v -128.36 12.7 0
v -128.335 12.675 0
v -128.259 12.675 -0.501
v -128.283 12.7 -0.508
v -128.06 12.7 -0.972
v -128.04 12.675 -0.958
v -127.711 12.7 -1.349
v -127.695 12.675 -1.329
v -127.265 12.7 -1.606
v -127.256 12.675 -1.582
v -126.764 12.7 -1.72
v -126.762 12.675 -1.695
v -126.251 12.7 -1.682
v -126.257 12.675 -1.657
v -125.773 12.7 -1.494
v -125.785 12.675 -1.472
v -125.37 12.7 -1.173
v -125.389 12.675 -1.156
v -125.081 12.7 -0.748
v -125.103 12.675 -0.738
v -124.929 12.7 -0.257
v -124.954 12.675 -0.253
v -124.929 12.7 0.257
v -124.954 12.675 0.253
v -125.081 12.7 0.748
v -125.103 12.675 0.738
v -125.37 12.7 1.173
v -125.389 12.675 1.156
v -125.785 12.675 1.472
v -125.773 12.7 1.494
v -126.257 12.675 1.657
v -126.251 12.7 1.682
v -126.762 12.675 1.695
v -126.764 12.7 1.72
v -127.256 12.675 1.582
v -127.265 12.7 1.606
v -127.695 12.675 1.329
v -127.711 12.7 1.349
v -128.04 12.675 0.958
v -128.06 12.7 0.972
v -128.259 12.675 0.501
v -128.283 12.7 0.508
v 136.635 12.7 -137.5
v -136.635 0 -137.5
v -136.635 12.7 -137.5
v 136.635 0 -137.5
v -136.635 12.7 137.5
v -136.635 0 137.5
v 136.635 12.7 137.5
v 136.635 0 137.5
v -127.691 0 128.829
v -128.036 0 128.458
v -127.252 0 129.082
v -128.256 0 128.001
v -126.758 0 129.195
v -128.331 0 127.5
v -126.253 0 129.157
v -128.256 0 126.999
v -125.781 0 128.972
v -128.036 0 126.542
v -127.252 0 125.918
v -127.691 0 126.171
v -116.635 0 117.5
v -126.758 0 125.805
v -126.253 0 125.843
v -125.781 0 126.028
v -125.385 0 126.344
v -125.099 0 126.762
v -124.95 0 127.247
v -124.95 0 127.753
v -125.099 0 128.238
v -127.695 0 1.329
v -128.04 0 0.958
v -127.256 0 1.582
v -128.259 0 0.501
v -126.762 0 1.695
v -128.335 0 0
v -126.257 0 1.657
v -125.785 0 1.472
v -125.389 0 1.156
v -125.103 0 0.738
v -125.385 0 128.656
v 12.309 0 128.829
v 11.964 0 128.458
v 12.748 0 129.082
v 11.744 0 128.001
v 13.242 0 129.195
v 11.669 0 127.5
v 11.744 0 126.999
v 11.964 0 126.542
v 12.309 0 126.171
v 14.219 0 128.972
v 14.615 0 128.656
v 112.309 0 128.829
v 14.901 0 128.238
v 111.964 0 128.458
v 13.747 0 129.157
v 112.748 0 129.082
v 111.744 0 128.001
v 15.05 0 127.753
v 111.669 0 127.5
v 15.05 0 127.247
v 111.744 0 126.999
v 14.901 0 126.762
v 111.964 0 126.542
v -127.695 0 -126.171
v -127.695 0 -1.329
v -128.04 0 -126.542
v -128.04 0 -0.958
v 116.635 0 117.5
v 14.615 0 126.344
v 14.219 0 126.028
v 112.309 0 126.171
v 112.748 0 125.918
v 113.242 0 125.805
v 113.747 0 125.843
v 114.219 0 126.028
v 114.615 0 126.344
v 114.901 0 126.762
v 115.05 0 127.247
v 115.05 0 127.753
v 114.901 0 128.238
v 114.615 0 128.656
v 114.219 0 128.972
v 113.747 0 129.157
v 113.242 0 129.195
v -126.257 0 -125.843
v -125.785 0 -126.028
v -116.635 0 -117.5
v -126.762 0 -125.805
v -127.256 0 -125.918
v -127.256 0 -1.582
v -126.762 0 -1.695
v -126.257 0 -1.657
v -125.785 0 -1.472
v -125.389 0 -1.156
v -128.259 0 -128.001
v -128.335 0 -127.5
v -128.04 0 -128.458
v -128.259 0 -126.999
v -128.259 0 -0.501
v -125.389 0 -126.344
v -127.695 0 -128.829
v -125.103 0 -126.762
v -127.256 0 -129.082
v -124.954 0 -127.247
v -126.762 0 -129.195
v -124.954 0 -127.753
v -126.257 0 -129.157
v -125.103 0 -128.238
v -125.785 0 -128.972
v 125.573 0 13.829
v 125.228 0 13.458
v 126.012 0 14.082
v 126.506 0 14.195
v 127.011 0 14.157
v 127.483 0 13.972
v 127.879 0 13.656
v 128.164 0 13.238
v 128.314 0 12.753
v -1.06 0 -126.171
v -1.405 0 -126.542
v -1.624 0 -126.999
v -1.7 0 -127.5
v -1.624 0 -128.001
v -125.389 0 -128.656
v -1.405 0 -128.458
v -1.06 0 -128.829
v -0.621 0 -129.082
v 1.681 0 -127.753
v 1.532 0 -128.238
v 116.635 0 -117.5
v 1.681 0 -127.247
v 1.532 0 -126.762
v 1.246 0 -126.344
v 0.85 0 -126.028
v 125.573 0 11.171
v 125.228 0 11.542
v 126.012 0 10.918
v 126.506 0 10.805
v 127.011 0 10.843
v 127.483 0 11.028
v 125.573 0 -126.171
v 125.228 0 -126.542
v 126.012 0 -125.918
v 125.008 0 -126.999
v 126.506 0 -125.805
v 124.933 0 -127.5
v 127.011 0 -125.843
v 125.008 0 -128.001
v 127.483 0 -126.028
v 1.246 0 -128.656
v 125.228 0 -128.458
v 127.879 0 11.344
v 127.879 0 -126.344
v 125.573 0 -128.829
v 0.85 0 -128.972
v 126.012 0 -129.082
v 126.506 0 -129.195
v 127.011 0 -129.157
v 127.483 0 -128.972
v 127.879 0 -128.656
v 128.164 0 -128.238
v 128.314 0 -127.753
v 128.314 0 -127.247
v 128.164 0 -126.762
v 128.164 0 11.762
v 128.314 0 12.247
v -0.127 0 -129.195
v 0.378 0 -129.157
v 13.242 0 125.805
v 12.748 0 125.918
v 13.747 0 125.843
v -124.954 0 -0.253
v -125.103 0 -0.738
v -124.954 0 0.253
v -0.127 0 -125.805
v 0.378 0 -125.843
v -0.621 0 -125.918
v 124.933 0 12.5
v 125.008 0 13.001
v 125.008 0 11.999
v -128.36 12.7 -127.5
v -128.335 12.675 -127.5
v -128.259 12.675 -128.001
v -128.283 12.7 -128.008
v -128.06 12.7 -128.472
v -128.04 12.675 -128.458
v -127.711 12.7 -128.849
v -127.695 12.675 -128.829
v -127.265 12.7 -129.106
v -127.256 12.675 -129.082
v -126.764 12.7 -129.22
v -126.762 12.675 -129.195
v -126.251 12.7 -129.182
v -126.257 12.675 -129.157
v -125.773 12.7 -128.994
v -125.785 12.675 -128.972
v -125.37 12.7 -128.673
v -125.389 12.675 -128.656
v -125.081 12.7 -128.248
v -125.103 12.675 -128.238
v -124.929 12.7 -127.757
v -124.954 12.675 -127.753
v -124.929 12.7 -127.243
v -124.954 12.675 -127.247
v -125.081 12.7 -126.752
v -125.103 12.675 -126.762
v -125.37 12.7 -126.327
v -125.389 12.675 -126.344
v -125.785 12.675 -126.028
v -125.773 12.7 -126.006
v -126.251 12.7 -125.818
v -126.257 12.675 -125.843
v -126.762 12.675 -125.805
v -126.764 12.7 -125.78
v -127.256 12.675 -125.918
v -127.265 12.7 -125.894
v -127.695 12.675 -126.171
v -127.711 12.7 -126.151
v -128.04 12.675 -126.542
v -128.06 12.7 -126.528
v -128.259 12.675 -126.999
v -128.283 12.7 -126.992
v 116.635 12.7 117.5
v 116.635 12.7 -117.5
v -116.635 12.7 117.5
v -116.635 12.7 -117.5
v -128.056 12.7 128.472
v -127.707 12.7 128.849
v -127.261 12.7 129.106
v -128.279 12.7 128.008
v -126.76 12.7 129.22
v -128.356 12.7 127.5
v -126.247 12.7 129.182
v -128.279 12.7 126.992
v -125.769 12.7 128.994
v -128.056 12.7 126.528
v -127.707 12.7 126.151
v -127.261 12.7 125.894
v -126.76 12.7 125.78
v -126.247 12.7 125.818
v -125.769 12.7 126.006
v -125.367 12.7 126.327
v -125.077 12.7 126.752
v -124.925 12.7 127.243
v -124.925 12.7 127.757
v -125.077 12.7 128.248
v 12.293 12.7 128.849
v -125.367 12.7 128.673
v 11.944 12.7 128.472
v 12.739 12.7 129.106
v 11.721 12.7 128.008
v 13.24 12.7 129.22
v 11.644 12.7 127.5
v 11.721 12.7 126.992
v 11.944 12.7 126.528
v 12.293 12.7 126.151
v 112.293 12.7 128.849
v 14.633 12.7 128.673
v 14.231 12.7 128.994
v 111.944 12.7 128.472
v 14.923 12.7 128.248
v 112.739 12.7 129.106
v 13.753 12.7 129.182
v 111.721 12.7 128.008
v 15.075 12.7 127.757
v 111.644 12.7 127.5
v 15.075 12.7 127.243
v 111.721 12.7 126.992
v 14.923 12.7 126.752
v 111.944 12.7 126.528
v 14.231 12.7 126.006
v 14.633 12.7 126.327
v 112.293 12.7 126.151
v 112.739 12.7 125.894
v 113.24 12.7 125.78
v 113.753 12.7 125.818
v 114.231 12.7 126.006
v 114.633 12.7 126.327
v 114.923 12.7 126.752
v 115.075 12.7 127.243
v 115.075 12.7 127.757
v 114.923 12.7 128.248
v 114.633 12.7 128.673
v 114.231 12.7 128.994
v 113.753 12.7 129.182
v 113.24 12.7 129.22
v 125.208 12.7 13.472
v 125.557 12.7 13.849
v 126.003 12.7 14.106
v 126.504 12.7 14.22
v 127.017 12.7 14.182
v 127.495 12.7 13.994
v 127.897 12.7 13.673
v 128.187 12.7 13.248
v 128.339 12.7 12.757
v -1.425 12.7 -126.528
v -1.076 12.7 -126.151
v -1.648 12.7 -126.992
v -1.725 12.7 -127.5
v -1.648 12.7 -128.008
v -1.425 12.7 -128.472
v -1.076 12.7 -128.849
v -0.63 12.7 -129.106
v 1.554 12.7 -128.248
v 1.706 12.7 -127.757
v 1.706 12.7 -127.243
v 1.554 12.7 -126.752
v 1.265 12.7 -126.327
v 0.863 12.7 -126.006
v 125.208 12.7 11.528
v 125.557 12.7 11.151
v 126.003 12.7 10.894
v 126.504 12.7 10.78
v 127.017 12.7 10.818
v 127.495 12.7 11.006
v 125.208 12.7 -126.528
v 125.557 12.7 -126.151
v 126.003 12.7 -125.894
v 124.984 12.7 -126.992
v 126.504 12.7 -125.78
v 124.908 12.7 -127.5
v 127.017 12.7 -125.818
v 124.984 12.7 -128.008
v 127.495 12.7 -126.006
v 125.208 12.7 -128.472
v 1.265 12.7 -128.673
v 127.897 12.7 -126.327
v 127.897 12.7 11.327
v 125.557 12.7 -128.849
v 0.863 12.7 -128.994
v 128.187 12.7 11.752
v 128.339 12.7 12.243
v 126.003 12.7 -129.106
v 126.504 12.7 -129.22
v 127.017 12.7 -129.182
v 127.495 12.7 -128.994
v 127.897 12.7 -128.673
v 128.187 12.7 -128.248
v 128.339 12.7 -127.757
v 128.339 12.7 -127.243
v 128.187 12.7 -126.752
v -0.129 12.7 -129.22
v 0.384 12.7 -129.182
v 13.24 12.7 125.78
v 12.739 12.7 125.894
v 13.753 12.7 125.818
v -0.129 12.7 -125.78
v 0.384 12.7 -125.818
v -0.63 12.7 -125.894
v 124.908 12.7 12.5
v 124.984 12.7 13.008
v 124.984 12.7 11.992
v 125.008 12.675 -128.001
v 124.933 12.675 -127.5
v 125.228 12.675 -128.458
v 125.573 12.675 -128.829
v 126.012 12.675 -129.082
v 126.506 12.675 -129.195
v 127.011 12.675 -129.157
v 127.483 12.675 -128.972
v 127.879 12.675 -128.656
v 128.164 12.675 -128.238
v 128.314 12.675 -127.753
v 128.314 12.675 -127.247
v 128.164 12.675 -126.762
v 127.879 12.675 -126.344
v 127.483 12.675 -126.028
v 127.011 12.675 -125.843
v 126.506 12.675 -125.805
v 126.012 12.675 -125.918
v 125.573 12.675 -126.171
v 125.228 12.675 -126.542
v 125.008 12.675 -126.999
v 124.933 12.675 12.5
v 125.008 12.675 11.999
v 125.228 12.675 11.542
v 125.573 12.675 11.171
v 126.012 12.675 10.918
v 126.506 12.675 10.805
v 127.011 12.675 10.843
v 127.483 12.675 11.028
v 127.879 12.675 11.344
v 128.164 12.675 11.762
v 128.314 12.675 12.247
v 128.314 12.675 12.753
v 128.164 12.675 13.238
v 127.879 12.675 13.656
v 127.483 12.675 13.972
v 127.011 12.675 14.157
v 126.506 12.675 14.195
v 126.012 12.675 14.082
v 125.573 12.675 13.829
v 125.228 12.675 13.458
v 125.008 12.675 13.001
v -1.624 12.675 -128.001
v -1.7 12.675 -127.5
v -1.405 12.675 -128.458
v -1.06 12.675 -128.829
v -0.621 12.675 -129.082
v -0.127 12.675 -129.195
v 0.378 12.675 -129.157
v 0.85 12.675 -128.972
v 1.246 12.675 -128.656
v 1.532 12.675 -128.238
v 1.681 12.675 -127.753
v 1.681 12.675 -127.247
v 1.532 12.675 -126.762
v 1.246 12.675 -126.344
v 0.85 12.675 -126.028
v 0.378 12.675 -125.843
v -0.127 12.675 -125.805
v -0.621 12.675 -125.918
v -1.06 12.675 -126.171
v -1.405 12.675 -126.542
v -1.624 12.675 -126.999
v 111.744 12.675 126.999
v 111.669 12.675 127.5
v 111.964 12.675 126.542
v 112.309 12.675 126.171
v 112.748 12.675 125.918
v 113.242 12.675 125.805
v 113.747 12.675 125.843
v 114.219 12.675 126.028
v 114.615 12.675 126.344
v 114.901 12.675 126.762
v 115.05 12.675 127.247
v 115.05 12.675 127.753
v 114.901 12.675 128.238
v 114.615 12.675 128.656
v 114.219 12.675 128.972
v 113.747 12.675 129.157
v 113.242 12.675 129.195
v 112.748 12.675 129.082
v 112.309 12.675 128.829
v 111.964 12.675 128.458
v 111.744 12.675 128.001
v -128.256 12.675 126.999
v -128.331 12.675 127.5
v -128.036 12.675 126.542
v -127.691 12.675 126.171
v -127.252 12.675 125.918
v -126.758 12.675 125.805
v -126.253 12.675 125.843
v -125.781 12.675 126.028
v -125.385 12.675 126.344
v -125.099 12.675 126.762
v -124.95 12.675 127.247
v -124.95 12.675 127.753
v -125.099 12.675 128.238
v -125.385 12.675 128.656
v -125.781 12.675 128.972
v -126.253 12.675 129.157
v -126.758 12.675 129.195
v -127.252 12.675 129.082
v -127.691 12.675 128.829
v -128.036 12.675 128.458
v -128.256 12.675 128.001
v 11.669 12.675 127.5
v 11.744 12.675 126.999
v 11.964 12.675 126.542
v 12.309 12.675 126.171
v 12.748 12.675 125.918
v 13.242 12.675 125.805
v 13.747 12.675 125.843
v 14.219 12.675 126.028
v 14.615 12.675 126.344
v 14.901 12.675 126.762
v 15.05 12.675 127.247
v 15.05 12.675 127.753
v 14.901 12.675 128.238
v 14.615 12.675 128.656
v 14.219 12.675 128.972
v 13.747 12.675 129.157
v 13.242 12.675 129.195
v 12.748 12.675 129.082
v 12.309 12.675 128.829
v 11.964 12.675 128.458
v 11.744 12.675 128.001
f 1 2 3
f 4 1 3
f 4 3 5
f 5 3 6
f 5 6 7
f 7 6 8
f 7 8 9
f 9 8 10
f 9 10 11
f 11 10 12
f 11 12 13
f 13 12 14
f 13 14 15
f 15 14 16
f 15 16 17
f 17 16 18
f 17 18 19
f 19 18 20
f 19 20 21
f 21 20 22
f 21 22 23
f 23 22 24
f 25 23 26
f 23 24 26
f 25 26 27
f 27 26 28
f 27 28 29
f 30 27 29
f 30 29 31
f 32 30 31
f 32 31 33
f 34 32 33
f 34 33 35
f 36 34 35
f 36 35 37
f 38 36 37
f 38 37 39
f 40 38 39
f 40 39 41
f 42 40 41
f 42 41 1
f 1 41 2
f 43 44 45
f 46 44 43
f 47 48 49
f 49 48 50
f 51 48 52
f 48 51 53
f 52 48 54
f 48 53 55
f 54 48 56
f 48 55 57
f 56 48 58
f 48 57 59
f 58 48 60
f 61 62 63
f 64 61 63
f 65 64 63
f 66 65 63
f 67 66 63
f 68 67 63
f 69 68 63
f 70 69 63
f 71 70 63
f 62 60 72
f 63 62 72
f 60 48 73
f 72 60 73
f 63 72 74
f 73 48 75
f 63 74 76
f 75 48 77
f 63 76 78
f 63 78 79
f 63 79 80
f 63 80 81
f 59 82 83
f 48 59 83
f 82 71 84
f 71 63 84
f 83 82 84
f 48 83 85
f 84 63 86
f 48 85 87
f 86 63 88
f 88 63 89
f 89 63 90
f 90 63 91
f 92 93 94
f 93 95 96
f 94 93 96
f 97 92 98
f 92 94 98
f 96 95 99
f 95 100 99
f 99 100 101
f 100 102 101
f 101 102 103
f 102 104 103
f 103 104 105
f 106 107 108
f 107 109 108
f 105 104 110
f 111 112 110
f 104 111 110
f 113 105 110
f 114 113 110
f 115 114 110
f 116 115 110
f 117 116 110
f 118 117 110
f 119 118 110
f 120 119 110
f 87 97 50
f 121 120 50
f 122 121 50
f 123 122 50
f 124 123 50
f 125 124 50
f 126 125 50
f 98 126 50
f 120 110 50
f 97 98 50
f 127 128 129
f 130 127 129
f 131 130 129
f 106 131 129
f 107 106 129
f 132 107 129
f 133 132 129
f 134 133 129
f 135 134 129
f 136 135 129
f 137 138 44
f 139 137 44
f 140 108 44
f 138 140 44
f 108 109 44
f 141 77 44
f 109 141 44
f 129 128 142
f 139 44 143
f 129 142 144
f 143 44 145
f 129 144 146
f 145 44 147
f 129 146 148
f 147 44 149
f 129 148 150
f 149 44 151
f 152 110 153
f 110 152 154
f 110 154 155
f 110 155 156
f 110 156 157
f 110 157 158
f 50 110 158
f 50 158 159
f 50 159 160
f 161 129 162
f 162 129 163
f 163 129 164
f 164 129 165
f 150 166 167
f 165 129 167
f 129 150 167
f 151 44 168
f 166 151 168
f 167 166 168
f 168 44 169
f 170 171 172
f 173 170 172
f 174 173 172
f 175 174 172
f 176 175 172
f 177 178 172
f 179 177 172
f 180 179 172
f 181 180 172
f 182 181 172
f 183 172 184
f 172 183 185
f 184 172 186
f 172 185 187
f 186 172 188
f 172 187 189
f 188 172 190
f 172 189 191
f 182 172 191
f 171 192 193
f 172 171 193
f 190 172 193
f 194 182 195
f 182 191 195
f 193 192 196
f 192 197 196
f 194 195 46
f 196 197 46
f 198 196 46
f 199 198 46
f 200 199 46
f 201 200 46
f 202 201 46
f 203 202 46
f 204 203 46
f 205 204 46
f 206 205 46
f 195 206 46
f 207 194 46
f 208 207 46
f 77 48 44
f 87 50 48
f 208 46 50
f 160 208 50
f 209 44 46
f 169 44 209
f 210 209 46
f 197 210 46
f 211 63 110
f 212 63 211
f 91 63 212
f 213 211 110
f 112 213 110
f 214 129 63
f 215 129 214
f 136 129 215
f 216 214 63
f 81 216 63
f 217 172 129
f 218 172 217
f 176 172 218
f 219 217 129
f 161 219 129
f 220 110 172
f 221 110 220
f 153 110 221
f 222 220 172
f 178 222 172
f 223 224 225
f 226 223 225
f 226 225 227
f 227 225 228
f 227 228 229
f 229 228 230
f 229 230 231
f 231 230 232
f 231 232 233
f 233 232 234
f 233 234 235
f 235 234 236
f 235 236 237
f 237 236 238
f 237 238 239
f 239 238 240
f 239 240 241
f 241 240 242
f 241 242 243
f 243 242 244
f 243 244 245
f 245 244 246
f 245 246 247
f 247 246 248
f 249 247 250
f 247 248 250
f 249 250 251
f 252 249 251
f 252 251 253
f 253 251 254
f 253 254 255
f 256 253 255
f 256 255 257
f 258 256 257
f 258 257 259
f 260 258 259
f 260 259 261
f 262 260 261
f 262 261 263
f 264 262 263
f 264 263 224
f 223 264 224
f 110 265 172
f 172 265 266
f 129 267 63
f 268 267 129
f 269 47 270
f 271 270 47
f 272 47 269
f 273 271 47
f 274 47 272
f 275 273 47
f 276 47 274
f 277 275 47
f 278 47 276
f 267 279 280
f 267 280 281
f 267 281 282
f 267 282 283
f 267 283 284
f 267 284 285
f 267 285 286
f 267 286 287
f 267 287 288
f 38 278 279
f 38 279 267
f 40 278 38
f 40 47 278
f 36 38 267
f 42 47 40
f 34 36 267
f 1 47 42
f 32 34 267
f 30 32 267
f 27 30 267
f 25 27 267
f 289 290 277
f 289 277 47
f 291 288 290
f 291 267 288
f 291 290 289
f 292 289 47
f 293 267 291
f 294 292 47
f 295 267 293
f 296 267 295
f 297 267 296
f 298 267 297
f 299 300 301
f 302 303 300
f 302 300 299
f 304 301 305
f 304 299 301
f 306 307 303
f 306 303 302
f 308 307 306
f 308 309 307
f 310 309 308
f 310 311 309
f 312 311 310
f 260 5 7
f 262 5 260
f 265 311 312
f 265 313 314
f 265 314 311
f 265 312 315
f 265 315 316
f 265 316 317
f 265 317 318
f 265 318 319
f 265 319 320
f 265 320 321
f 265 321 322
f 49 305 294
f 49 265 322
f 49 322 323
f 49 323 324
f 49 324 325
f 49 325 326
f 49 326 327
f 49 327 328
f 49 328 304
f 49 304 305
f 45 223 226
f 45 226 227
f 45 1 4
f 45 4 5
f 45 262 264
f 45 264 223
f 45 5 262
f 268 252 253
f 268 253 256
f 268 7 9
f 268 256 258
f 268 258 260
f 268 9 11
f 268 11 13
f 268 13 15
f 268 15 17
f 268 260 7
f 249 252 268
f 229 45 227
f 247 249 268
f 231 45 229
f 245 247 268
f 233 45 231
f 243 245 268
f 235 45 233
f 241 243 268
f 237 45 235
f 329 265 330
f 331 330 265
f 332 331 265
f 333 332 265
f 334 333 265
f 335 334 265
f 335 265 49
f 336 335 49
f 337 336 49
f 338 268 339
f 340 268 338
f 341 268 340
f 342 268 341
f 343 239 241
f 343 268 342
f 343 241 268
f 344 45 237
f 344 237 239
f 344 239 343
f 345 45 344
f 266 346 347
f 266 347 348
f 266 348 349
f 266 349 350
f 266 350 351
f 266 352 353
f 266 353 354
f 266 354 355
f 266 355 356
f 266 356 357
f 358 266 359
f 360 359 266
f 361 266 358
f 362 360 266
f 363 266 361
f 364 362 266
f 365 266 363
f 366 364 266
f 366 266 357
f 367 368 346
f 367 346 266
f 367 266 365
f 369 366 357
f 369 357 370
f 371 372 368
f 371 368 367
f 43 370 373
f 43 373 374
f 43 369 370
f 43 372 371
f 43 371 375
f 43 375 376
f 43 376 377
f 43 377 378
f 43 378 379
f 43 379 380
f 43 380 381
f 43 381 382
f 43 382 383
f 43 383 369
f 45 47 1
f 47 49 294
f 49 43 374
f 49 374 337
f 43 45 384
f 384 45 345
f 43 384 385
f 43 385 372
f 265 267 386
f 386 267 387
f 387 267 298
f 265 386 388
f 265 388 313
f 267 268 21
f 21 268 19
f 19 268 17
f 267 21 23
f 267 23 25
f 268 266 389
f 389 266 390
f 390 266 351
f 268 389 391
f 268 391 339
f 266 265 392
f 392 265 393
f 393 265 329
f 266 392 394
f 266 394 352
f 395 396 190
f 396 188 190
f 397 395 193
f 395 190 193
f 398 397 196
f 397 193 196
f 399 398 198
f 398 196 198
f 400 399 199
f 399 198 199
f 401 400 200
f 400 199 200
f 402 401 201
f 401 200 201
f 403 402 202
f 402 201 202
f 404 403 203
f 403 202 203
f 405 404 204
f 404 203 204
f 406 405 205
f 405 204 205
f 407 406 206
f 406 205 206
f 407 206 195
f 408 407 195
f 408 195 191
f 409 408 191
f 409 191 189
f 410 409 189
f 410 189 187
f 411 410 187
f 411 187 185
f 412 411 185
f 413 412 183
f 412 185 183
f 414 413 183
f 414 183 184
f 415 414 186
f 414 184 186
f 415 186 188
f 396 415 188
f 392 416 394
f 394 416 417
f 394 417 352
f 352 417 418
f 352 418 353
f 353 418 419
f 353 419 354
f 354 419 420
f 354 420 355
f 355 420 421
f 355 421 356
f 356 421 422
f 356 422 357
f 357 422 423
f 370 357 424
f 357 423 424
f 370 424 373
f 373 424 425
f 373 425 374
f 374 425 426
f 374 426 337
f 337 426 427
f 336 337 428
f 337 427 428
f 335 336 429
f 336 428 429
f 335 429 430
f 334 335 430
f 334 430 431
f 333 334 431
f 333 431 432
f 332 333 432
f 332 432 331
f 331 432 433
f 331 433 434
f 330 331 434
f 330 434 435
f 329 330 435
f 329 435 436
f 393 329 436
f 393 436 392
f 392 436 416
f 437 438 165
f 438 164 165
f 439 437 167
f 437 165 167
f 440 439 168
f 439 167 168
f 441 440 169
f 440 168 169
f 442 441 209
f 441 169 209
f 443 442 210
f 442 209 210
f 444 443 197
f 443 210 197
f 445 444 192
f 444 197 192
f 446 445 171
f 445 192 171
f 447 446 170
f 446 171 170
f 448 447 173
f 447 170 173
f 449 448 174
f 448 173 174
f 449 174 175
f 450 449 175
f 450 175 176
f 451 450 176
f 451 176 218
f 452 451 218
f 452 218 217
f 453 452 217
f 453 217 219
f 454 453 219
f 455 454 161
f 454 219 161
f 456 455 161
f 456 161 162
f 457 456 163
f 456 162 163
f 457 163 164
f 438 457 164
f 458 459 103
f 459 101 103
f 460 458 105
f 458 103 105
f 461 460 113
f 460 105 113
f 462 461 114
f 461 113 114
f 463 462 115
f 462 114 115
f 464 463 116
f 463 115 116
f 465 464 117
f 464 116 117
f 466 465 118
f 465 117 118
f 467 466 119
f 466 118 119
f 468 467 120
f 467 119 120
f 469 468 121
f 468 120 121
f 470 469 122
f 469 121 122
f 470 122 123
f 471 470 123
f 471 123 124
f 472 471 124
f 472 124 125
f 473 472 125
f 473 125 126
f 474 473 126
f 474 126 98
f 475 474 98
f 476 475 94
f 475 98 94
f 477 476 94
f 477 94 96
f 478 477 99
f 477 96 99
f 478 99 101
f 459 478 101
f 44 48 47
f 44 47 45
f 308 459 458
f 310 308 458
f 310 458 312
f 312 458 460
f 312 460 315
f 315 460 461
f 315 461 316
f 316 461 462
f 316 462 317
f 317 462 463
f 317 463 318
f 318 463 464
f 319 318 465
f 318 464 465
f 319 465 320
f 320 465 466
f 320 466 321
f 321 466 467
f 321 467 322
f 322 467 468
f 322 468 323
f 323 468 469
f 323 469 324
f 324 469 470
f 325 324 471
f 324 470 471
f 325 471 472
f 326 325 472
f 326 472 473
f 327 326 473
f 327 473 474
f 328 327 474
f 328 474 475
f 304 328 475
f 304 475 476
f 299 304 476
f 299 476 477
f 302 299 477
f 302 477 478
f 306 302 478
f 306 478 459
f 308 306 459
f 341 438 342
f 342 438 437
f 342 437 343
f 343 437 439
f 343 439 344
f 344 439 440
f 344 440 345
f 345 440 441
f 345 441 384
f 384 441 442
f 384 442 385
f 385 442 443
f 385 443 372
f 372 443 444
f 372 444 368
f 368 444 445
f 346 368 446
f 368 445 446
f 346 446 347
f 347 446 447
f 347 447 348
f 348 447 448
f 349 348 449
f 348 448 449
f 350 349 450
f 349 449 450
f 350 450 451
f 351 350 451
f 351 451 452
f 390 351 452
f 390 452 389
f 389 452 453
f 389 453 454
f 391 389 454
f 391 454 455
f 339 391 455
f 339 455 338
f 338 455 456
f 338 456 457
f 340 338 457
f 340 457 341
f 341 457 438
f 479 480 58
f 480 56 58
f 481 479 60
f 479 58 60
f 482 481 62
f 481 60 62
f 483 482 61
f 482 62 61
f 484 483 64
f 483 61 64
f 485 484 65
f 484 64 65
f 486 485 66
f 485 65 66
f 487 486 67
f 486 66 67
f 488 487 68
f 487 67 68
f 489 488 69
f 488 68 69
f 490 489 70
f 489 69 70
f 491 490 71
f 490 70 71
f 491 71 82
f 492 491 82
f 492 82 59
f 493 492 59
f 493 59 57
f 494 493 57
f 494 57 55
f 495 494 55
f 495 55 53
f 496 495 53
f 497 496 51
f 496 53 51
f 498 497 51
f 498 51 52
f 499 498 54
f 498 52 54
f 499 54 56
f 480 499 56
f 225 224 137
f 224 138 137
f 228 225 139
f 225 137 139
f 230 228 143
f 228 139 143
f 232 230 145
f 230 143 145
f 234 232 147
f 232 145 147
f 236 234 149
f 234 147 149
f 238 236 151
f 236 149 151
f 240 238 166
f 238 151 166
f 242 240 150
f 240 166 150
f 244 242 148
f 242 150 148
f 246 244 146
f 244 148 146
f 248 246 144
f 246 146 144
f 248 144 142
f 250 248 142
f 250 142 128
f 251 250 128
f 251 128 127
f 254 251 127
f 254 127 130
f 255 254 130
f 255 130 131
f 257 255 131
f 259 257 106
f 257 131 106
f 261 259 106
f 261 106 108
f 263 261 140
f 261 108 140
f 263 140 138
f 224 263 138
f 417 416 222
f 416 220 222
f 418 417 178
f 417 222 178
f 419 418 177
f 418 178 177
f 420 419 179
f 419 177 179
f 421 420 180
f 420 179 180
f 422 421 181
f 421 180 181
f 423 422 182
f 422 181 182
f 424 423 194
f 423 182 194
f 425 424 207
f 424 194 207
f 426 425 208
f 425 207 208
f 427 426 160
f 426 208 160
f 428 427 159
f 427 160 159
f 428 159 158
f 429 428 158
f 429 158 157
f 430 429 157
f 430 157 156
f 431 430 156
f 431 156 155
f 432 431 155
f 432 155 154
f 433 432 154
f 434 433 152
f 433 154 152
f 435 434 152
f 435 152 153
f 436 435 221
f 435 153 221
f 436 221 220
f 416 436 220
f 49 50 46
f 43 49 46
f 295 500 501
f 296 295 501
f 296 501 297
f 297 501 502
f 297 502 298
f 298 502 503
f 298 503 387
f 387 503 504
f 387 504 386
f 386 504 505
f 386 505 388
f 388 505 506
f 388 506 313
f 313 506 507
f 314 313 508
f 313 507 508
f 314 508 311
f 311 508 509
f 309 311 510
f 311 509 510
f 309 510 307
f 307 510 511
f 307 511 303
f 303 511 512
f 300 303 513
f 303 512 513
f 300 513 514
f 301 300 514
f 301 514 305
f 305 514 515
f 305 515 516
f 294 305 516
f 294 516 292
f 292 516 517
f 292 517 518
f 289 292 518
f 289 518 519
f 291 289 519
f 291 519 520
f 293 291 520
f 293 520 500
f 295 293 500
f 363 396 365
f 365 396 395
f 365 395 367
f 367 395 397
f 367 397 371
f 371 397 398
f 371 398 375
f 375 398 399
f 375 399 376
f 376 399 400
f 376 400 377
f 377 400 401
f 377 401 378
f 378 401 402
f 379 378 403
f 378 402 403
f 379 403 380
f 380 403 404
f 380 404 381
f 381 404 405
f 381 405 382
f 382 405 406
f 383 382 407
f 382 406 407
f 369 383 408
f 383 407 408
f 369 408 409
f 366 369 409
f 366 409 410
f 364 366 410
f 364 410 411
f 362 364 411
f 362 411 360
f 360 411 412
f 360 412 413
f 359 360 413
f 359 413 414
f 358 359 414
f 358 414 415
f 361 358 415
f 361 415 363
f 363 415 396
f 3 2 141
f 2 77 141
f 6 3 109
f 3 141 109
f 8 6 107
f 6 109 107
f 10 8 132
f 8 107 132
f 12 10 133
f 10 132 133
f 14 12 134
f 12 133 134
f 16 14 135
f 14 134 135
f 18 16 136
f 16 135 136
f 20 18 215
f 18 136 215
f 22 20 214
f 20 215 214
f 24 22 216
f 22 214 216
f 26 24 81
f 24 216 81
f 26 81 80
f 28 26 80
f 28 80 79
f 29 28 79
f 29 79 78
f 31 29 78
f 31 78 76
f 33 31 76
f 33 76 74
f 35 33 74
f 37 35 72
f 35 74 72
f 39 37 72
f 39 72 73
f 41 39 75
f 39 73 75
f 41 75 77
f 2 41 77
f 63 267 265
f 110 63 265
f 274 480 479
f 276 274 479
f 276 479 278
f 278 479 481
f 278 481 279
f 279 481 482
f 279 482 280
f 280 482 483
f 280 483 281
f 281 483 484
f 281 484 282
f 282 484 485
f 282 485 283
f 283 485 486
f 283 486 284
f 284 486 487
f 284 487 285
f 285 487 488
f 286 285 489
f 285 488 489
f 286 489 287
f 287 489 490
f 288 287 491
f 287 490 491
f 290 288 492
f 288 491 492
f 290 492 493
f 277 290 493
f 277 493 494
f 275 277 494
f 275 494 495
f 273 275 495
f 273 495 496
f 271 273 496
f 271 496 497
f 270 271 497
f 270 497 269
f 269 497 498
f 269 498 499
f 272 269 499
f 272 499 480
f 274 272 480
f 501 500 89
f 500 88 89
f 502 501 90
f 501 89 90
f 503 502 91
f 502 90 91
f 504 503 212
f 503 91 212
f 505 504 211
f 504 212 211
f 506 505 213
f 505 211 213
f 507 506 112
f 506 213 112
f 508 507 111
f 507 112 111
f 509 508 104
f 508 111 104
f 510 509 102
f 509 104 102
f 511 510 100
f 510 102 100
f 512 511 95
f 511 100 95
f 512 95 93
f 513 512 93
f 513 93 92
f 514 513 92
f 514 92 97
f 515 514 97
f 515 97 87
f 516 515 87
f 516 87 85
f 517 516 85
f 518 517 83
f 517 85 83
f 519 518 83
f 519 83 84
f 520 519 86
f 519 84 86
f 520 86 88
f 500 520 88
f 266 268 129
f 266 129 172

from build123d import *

# Parameters (mm, degrees)
SKETCH1_W                      = 273.27
SKETCH1_H                      = 275
BOSS_EXTRUDE1_DEPTH            = 12.7
SKETCH2_W                      = 233.27
SKETCH2_H                      = 235
CUT_EXTRUDE1_DEPTH             = 12.7
M3_CLEARANCE_HOLE1_D           = 3.4
M3_CLEARANCE_HOLE1_CSINK_D     = 3.45
M3_CLEARANCE_HOLE1_CSINK_ANGLE = 90
M3_CLEARANCE_HOLE2_D           = 3.4
M3_CLEARANCE_HOLE2_CSINK_D     = 3.45
M3_CLEARANCE_HOLE2_CSINK_ANGLE = 90


with BuildPart() as part:
    # Sketch1 → Boss-Extrude1 (new body)
    with BuildSketch(Plane(origin=(0, 0, 0), x_dir=(1, 0, 0), z_dir=(0, 1, 0))):
        Rectangle(SKETCH1_W, SKETCH1_H)
    extrude(amount=BOSS_EXTRUDE1_DEPTH)

    # Sketch2 → Cut-Extrude1 (cut)
    with BuildSketch(Plane(origin=(0, 12.7, 0), x_dir=(1, 0, 0), z_dir=(0, 1, 0))):
        Rectangle(SKETCH2_W, SKETCH2_H)
    extrude(amount=-CUT_EXTRUDE1_DEPTH, mode=Mode.SUBTRACT)

    # M3 Clearance Hole1 (through all)
    with Locations(Plane(origin=(0, 12.7, 0), x_dir=(1, 0, 0), z_dir=(0, 1, 0))):
        with Locations((0, 127.5), (-126.635, 127.5), (126.6328, 127.5), (-126.635, 0), (13.3689, -127.5), (113.3689, -127.5), (126.6328, -12.5)):
            CounterSinkHole(M3_CLEARANCE_HOLE1_D / 2, M3_CLEARANCE_HOLE1_CSINK_D / 2, counter_sink_angle=M3_CLEARANCE_HOLE1_CSINK_ANGLE)

    # M3 Clearance Hole2 (through all)
    with Locations(Plane(origin=(0, 12.7, 0), x_dir=(1, 0, 0), z_dir=(0, 1, 0))):
        with Locations((-126.6311, -127.5)):
            CounterSinkHole(M3_CLEARANCE_HOLE2_D / 2, M3_CLEARANCE_HOLE2_CSINK_D / 2, counter_sink_angle=M3_CLEARANCE_HOLE2_CSINK_ANGLE)


solid = part.part
